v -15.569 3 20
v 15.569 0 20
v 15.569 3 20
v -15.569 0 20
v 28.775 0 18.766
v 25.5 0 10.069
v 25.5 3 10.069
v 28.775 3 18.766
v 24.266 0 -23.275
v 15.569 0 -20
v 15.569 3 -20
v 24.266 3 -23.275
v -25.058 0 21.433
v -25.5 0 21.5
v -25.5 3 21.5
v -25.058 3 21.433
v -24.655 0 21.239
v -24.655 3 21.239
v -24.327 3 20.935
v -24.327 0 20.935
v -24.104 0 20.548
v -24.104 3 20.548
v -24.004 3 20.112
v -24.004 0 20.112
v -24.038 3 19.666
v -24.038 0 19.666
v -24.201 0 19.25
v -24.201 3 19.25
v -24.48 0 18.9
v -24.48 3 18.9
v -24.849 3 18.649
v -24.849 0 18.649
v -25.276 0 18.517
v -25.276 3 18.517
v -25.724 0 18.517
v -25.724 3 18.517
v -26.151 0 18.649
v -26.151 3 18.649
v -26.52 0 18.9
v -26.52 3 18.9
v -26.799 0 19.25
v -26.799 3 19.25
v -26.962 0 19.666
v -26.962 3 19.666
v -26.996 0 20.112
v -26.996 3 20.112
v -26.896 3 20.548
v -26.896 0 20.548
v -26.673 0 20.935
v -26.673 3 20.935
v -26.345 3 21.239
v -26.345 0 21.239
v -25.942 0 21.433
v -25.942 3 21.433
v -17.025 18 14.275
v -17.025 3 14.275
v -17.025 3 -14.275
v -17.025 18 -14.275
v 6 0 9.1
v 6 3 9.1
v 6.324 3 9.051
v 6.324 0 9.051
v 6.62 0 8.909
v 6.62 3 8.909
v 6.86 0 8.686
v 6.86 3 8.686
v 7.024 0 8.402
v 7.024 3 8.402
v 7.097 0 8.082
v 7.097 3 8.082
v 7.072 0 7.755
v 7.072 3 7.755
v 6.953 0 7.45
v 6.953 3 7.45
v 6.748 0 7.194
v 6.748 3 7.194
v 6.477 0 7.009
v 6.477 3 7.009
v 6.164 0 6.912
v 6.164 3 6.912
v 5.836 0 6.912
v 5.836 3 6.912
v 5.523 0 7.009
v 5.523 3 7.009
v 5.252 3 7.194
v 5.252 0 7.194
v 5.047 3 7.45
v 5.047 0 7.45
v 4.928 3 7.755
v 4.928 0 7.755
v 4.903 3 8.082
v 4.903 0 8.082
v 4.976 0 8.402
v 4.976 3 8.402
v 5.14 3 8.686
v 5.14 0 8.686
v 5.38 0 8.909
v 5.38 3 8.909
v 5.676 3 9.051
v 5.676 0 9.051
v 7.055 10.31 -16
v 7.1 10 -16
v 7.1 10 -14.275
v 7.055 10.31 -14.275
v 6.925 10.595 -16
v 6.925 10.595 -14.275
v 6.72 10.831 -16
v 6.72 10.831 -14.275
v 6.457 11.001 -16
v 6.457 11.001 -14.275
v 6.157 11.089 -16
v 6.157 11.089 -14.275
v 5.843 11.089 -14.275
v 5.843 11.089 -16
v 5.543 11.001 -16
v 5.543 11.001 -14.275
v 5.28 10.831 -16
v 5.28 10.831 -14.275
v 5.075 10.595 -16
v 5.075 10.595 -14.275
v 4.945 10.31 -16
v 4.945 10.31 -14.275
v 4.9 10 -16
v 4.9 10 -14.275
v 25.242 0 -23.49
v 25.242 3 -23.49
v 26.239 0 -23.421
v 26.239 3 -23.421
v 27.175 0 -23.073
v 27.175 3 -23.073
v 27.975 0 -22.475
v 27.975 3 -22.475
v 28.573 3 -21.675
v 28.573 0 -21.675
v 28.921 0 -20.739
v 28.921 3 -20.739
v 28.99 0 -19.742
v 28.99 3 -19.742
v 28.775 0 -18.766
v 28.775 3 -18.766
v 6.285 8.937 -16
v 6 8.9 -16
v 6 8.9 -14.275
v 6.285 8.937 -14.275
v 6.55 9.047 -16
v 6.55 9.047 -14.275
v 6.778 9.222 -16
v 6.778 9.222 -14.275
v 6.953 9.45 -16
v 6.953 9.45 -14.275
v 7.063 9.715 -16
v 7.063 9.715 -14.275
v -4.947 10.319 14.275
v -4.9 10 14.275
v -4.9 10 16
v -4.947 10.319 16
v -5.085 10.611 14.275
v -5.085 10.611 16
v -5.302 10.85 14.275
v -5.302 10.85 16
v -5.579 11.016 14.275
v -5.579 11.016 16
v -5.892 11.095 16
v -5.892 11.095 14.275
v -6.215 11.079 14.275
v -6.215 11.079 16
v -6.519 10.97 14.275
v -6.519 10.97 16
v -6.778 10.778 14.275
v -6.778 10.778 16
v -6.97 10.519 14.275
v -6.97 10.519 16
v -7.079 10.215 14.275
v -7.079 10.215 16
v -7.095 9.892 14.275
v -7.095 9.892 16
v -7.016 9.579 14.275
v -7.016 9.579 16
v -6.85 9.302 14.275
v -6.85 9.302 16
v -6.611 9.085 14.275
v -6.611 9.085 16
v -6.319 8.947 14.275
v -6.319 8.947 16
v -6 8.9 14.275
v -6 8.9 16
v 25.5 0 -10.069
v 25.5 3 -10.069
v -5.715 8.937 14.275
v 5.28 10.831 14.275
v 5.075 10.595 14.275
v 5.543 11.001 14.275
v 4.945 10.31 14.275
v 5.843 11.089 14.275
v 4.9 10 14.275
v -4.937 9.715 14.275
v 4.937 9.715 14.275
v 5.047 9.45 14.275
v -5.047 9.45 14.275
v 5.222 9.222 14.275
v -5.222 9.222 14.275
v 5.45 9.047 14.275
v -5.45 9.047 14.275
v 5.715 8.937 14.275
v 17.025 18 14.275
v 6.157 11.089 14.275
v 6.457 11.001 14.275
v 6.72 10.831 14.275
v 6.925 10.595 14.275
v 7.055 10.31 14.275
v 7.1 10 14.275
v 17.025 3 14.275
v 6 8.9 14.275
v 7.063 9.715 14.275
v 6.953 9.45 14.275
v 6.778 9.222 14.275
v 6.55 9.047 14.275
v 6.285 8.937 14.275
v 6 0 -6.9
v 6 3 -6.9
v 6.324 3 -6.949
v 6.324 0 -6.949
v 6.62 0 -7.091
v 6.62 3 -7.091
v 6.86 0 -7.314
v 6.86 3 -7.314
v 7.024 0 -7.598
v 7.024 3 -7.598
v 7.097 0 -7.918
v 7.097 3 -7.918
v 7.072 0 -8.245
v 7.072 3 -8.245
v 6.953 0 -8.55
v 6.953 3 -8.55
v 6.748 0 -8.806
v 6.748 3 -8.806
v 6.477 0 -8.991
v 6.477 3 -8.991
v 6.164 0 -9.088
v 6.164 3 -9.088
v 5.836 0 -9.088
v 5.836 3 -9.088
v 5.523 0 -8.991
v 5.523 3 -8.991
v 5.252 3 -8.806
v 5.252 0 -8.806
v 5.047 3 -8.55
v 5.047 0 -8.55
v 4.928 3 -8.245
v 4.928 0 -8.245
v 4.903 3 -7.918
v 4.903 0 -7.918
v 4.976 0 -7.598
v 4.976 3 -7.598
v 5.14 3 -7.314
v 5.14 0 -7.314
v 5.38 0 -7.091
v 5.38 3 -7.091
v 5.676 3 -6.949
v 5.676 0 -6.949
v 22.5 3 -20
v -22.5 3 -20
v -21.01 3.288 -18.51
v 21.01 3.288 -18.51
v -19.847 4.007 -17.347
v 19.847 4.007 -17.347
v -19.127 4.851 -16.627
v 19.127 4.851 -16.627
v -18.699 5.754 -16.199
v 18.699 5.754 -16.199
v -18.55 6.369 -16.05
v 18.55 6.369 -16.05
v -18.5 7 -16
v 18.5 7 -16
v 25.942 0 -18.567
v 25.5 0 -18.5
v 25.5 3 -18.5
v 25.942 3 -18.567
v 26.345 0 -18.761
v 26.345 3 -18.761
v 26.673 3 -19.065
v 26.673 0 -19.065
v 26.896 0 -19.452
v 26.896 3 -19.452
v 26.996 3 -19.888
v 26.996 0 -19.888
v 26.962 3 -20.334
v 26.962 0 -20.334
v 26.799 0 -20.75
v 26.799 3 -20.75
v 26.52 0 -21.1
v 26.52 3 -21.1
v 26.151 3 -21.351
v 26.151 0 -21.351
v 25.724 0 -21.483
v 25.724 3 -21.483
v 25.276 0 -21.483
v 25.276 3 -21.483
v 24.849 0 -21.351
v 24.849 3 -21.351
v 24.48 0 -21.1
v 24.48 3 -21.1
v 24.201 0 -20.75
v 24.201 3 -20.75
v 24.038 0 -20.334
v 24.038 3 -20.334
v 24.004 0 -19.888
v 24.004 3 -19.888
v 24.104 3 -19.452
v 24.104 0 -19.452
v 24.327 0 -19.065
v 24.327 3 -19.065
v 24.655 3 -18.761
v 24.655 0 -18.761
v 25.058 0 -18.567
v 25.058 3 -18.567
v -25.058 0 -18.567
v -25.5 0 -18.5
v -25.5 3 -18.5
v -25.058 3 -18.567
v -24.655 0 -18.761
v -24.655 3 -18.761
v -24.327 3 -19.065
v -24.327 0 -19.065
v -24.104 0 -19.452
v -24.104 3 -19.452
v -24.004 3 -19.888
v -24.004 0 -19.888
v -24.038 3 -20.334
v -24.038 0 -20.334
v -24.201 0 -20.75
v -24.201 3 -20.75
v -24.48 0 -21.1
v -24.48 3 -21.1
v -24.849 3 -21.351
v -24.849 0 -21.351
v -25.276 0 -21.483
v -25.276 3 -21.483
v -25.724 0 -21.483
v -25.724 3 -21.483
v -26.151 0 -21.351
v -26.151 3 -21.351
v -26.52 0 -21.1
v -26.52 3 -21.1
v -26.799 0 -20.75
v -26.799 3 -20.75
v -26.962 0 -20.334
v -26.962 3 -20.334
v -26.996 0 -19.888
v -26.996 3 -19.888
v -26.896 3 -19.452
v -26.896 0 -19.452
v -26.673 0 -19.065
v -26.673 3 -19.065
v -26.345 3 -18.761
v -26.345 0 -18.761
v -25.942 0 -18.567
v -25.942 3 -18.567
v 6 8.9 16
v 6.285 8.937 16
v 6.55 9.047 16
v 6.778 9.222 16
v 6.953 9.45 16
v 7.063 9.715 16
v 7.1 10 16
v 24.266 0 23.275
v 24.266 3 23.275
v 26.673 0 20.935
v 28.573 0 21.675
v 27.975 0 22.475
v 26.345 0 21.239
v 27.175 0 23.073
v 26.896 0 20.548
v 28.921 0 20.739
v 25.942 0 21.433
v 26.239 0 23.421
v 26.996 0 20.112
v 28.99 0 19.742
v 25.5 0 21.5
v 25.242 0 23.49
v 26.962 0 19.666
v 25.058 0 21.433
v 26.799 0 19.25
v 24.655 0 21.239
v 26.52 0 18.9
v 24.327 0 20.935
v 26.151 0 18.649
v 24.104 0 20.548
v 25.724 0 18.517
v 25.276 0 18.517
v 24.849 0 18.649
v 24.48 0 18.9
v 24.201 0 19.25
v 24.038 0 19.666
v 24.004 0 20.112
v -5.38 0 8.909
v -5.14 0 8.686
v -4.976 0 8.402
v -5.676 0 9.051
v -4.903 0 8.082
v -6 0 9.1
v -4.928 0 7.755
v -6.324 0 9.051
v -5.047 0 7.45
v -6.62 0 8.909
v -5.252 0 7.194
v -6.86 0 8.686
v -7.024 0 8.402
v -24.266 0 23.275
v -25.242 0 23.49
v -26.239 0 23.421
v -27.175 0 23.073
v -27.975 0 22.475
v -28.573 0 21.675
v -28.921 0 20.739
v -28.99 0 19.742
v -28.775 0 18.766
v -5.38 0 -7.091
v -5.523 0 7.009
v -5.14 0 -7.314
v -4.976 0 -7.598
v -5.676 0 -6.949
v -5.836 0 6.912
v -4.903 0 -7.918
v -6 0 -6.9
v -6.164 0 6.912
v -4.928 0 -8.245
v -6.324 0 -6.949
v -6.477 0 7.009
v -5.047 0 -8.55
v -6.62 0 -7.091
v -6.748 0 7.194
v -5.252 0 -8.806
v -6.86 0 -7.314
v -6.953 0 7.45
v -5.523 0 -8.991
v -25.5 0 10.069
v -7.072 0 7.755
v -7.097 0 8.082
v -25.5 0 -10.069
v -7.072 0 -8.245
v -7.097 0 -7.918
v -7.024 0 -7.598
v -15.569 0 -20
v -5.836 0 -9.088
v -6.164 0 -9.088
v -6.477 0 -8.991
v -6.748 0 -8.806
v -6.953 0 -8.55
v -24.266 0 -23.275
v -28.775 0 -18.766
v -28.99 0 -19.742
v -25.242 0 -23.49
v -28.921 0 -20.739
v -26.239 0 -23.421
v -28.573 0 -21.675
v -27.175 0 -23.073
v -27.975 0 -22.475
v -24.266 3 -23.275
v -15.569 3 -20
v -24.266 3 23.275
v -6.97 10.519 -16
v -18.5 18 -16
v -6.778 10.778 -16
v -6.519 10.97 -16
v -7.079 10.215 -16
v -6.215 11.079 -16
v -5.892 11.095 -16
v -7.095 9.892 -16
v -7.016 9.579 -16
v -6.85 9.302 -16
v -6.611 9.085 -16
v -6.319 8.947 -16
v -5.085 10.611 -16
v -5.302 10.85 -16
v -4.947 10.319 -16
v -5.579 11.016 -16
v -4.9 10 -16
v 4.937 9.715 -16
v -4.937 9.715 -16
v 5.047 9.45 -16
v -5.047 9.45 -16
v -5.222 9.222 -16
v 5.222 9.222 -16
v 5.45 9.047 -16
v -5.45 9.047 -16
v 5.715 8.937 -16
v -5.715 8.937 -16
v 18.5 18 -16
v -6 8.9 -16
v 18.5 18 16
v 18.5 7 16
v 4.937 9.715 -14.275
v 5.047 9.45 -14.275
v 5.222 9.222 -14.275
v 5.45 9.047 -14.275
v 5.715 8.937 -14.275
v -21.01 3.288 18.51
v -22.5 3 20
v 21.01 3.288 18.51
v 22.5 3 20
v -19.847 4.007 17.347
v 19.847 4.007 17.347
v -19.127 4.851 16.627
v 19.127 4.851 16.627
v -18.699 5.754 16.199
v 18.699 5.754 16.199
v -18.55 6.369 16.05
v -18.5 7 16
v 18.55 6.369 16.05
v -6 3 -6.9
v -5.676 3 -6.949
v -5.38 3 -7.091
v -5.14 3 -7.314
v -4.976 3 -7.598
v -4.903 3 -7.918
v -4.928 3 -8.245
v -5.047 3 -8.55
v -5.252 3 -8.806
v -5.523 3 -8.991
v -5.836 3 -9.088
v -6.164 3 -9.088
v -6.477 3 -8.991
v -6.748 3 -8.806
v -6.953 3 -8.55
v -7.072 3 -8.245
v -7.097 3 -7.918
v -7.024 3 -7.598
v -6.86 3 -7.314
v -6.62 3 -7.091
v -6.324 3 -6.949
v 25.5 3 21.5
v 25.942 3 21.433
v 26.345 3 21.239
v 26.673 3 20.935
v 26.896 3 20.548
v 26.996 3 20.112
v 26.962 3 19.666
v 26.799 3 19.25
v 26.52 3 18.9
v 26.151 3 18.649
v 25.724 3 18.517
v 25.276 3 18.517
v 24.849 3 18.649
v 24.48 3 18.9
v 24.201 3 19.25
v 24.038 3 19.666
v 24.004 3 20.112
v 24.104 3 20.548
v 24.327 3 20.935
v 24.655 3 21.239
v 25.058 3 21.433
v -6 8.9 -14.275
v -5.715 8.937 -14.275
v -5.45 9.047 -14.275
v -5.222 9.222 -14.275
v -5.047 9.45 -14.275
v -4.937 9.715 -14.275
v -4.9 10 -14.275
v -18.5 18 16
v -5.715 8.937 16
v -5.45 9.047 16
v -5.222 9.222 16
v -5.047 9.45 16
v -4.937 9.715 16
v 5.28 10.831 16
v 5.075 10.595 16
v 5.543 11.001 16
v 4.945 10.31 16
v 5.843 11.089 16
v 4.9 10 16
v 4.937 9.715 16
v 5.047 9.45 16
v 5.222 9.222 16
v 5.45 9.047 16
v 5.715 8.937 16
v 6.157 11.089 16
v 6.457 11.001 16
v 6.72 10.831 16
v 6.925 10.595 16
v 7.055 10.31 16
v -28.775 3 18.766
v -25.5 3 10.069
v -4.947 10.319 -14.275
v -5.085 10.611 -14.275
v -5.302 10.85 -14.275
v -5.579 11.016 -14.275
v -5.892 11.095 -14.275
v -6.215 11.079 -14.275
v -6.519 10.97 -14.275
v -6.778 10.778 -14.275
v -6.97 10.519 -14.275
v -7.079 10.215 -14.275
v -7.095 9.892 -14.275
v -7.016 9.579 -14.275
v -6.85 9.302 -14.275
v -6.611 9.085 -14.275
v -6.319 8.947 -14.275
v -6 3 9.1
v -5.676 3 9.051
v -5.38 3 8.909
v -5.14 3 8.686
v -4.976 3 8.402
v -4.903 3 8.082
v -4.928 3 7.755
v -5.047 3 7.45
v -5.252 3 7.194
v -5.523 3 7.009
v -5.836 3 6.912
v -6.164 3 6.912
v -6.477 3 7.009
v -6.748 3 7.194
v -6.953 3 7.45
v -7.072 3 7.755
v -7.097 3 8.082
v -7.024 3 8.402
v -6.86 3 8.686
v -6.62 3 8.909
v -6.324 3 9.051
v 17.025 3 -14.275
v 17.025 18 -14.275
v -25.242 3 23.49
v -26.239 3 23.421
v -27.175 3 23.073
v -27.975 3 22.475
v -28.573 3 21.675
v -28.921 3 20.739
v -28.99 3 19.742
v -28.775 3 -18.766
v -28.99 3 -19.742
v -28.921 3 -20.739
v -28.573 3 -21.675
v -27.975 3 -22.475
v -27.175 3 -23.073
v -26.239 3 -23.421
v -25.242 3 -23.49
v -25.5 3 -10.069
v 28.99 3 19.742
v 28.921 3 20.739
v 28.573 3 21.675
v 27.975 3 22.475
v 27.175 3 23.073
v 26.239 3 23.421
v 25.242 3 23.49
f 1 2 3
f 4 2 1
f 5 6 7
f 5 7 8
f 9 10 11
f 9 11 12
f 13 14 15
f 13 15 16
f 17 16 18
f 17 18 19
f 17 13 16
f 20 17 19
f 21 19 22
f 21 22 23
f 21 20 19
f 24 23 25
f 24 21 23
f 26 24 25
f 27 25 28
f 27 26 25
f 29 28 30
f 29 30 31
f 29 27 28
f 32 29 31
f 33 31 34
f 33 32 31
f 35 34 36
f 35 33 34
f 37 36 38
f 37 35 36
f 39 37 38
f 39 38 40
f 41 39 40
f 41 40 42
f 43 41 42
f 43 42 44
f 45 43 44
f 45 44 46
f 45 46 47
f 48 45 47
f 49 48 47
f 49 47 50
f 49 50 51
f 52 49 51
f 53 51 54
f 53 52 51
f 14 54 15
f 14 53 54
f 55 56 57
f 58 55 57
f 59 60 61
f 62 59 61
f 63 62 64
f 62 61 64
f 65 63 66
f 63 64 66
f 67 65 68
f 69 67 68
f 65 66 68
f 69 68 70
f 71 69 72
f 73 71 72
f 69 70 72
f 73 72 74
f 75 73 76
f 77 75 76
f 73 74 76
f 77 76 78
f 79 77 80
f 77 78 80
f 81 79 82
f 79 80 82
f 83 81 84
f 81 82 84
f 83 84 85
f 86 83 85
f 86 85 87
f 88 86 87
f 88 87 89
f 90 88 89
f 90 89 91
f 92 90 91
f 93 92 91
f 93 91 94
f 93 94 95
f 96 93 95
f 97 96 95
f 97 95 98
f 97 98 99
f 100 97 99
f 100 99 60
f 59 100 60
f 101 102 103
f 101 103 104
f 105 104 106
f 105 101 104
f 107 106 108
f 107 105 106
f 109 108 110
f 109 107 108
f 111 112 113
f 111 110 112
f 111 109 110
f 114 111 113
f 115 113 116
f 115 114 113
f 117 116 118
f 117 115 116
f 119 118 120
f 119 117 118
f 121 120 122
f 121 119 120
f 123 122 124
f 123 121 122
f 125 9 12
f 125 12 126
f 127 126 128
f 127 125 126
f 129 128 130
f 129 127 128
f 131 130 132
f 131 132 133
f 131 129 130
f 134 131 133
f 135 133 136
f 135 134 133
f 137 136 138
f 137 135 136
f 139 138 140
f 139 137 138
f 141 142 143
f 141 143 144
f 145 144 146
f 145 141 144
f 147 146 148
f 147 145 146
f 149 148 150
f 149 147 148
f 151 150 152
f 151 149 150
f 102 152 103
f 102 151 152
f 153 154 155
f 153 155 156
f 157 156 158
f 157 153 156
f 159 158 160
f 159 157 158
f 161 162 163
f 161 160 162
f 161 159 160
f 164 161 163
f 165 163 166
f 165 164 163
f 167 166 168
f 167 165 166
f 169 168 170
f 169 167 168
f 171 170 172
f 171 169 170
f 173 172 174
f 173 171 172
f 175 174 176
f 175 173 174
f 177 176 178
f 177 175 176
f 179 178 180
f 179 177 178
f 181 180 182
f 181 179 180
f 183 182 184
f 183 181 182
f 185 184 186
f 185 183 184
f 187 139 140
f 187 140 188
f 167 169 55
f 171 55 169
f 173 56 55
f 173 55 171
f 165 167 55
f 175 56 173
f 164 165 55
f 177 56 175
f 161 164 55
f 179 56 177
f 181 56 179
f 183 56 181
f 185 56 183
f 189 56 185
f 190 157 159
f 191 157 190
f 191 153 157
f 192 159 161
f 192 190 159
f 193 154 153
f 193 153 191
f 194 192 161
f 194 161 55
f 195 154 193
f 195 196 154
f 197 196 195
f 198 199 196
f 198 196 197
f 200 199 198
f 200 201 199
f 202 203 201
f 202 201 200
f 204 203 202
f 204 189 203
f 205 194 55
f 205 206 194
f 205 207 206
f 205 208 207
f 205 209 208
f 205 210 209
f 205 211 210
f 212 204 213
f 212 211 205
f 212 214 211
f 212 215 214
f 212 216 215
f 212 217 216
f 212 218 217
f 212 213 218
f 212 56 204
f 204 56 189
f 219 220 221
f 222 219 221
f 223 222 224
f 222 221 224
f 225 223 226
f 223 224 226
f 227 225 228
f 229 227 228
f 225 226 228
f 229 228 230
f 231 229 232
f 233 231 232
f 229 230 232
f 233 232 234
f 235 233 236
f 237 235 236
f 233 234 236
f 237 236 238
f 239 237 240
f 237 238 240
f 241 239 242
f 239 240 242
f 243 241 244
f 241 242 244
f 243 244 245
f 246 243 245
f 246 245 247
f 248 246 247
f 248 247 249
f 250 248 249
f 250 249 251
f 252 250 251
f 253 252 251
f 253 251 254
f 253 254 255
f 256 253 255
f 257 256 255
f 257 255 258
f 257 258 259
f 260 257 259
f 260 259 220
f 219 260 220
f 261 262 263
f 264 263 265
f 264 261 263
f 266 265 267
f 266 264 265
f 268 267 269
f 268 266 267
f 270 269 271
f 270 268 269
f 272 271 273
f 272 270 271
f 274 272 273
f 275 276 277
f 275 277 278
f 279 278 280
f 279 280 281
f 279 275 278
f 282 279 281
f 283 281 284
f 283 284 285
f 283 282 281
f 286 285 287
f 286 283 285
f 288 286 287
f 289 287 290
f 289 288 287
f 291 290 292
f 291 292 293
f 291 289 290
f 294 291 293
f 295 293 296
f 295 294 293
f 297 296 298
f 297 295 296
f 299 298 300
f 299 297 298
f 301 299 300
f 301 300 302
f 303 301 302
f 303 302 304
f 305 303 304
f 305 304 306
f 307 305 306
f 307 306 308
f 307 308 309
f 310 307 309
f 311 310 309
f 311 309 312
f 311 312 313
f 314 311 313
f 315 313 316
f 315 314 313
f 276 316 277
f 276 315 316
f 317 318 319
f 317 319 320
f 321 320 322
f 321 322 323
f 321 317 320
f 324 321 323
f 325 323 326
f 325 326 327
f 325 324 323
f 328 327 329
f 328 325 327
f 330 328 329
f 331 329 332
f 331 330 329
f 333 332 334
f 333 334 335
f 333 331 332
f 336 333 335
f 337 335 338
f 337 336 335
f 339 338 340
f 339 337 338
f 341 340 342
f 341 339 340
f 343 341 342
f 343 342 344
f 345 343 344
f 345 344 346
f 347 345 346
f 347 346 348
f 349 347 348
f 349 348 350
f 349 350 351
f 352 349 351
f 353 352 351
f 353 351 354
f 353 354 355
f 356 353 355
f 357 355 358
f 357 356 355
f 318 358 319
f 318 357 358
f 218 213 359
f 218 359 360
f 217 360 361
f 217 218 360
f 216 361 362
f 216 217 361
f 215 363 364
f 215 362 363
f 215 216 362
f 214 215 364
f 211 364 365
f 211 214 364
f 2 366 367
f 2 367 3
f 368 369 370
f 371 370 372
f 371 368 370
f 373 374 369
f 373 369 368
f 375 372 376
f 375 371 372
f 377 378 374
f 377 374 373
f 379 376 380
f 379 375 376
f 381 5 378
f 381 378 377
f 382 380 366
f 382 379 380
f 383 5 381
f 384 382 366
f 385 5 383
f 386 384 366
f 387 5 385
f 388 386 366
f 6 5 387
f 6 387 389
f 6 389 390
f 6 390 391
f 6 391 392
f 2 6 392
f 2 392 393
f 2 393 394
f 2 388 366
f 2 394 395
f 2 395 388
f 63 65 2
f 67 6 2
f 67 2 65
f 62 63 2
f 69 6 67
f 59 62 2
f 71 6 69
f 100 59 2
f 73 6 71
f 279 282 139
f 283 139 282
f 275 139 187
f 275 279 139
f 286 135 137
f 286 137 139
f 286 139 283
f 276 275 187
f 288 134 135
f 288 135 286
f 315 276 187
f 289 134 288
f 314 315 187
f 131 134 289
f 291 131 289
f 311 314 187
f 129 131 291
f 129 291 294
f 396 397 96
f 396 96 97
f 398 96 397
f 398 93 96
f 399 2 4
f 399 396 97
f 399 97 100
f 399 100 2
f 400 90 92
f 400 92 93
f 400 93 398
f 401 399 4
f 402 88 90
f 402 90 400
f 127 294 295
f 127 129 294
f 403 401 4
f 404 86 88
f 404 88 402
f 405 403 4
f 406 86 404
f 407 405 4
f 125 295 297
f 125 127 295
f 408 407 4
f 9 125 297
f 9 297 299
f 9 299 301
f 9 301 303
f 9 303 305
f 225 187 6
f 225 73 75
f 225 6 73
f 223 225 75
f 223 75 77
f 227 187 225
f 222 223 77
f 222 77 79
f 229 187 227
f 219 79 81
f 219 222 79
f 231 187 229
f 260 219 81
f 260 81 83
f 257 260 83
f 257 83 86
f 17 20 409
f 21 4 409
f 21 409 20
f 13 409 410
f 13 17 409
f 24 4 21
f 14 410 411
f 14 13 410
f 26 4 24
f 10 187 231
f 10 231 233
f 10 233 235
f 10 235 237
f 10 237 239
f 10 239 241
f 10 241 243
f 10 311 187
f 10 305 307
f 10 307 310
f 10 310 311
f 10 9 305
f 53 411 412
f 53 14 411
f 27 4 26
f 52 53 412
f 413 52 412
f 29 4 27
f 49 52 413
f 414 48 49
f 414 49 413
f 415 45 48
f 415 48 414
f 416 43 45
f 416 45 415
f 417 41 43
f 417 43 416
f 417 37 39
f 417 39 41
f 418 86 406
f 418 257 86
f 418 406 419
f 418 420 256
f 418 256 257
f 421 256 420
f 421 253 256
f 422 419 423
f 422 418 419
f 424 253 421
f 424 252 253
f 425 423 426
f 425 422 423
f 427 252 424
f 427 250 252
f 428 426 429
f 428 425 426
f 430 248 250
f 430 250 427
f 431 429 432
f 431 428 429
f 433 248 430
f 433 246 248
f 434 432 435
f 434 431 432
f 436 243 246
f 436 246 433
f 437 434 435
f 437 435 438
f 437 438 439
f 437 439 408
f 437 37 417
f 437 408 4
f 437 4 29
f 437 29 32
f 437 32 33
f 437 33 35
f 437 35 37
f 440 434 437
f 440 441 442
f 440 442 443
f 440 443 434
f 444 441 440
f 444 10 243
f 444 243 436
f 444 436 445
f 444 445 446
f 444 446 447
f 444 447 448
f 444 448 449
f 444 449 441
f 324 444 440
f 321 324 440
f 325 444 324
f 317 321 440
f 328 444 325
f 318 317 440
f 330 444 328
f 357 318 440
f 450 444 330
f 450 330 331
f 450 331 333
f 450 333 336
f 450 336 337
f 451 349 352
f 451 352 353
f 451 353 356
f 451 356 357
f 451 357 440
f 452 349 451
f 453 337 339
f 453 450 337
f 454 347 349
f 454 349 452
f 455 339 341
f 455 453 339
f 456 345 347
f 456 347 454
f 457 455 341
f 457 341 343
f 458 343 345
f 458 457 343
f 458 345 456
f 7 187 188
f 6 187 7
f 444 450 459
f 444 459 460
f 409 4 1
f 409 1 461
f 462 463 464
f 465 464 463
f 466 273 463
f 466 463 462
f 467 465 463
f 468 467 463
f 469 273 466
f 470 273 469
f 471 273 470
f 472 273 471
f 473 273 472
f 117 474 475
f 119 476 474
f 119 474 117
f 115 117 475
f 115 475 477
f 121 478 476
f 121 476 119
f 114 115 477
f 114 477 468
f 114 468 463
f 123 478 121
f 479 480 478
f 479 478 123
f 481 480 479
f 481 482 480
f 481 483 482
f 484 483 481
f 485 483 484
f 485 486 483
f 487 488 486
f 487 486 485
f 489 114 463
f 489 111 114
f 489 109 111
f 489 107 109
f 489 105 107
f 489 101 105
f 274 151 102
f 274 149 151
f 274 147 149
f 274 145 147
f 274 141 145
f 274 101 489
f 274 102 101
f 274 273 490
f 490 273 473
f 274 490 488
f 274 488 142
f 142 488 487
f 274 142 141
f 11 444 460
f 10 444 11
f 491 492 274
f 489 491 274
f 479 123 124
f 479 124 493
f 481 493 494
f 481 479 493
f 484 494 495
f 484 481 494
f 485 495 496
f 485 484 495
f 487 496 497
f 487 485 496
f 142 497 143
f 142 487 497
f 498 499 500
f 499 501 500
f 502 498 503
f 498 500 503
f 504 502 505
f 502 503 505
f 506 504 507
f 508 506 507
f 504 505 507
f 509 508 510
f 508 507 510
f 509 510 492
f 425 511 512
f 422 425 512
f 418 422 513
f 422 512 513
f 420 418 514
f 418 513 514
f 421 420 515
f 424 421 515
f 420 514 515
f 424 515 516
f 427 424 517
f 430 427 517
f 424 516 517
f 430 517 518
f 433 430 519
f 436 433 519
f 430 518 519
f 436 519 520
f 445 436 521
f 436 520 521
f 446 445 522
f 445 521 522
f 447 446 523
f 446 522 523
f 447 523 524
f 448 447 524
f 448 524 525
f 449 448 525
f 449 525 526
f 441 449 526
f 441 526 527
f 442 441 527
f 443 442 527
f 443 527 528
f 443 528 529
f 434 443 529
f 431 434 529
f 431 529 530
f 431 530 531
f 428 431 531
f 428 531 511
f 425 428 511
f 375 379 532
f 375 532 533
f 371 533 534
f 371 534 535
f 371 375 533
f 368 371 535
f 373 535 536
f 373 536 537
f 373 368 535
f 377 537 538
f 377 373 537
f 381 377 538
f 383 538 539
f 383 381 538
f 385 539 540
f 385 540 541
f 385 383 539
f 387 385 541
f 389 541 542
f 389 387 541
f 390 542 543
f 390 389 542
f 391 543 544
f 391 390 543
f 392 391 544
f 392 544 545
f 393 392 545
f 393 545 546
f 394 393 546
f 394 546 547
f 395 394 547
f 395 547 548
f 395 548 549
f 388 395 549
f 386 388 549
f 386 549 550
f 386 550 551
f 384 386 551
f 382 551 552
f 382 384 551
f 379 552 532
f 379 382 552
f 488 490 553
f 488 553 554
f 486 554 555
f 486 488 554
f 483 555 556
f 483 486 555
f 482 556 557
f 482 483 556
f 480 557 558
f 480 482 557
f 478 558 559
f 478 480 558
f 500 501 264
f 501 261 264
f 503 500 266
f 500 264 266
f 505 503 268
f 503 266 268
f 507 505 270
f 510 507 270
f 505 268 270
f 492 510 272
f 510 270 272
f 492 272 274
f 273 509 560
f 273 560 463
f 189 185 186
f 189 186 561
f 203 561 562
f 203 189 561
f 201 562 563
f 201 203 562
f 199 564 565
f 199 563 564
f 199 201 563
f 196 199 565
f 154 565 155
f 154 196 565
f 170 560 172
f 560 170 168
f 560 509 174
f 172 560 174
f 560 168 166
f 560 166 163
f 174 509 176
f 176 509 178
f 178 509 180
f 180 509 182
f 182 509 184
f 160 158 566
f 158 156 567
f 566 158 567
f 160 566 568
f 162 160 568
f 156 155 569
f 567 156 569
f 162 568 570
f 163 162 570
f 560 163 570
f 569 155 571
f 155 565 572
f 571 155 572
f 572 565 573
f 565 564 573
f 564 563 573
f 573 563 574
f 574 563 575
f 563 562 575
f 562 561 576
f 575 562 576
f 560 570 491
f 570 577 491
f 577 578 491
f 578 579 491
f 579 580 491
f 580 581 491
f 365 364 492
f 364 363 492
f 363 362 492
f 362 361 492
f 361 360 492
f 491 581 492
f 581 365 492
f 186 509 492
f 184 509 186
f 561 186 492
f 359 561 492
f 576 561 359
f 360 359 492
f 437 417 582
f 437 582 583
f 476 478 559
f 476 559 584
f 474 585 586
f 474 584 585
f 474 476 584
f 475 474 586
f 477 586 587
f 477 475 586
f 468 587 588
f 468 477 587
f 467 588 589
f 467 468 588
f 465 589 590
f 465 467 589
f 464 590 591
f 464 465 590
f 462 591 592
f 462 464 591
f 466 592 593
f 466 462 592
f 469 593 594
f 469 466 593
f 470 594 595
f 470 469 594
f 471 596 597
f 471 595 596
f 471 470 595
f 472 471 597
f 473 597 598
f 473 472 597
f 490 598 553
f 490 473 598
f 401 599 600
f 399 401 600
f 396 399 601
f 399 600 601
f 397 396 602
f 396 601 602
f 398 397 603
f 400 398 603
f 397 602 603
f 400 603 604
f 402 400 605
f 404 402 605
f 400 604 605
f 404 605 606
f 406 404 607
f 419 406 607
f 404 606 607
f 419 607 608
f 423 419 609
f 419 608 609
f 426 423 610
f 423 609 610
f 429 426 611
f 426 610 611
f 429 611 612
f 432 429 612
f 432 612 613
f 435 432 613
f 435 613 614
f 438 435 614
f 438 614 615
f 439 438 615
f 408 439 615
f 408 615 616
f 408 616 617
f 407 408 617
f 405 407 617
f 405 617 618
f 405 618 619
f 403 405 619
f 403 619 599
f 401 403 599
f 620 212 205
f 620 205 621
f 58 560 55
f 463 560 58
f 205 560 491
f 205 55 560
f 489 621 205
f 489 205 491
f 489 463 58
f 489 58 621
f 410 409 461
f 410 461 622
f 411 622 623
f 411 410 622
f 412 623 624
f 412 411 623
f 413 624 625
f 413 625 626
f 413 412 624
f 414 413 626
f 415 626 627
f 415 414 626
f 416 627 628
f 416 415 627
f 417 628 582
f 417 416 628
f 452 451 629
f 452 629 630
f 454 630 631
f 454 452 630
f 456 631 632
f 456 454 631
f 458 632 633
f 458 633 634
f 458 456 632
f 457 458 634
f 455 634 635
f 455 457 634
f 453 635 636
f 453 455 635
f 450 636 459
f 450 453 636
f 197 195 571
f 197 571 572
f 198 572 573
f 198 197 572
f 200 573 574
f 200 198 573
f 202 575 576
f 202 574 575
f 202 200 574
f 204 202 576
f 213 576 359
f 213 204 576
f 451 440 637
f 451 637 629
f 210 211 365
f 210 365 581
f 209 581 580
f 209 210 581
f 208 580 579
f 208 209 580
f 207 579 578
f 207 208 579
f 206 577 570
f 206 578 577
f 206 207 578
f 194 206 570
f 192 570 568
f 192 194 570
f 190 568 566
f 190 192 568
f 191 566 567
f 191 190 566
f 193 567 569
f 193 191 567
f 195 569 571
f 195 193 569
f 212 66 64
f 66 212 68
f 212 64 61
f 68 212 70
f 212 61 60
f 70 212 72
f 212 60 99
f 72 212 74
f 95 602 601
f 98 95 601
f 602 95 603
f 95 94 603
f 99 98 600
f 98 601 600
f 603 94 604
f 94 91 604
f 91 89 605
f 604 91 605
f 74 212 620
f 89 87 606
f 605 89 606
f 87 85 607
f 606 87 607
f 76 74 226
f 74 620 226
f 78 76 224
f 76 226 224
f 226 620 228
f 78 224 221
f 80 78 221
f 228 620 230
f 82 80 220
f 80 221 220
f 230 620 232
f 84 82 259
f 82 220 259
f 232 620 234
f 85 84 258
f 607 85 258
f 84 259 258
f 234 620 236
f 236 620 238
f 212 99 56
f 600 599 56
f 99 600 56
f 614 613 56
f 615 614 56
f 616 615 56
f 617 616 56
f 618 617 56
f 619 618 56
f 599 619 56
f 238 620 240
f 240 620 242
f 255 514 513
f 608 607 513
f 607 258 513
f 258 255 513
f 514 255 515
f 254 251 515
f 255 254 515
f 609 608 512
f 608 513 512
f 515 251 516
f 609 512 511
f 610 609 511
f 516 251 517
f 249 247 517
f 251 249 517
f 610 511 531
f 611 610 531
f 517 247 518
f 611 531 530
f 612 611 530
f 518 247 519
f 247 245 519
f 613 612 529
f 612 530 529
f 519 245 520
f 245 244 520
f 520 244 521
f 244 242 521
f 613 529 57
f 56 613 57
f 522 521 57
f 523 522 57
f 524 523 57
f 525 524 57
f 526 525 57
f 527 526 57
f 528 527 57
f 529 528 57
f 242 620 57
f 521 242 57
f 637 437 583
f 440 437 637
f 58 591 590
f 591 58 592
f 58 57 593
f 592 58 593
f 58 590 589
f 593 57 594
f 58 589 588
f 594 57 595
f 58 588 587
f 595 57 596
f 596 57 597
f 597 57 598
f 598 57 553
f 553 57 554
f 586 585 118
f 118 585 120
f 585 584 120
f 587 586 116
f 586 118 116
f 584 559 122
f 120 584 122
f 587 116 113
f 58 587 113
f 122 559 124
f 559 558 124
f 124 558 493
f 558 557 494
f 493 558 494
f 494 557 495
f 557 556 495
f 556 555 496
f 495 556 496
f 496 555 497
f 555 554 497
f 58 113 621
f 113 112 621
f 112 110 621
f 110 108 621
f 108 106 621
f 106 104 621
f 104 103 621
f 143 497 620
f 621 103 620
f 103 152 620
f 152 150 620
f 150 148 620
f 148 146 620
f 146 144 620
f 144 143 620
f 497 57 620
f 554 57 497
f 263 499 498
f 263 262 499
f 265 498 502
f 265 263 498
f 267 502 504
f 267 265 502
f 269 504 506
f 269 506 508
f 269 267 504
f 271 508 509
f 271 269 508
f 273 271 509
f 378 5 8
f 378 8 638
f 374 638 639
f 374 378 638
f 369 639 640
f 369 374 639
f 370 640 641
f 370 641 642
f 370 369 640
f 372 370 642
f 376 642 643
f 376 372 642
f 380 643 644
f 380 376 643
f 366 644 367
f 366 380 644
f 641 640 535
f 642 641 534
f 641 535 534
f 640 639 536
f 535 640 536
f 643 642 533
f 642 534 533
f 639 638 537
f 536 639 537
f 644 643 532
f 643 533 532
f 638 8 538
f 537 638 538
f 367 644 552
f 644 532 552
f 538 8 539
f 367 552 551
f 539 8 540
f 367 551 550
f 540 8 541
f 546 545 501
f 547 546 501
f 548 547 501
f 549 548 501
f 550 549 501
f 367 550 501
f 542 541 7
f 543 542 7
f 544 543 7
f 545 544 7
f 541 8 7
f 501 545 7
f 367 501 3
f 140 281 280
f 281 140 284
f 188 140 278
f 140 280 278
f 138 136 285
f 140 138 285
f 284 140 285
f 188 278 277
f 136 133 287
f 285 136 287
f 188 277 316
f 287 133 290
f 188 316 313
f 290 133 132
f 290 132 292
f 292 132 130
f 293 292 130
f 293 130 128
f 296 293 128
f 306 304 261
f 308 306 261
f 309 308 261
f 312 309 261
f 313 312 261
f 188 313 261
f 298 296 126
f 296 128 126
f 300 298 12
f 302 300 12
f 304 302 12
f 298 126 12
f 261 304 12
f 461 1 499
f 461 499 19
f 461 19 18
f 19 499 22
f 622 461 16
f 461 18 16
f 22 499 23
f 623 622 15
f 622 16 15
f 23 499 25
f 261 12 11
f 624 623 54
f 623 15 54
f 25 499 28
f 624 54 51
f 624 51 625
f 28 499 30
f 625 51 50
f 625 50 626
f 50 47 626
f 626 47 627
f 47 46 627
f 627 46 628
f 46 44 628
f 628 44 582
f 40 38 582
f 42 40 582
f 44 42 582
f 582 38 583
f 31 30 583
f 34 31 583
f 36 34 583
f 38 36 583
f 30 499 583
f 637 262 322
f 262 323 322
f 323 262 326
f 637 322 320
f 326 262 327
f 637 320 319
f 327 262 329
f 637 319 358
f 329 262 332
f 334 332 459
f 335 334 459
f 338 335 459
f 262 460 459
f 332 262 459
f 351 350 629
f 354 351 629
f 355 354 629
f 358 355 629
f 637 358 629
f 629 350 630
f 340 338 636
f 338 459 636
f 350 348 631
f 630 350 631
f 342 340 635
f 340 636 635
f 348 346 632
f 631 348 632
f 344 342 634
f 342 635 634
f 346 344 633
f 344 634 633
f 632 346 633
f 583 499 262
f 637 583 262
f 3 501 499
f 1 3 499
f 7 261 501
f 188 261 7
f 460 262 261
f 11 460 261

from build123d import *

# Parameters (mm, degrees)
SKETCH1_R               = 1.5
BOSS_EXTRUDE2_DEPTH     = 3
SKETCH2_W               = 37
SKETCH2_H               = 32
SKETCH2_W_2             = 34.05
SKETCH2_H_2             = 28.55
BOSS_EXTRUDE3_DEPTH     = 15
CUT_EXTRUDE1_DEPTH      = 40
CUT_EXTRUDE1_DEPTH_BACK = 11
SKETCH2_4_R             = 1.1
CUT_EXTRUDE2_DEPTH      = 11
FILLET1_R               = 4


with BuildPart() as part:
    # Sketch1 → Boss-Extrude2 (new body)
    with BuildSketch(Plane(origin=(0, 0, 0), x_dir=(1, 0, 0), z_dir=(0, 1, 0))):
        with BuildLine():
            Line((-24.266499455, 23.2754353), (-15.568913997, 20))
            Line((-15.568913997, 20), (15.568913997, 20))
            Line((15.568913997, 20), (24.266499455, 23.2754353))
            ThreePointArc((24.266499455, 23.2754353), (27.974873734, 22.474873734), (28.7754353, 18.766499455))
            Line((28.7754353, 18.766499455), (25.5, 10.068913997))
            Line((25.5, 10.068913997), (25.5, -10.068913997))
            Line((25.5, -10.068913997), (28.7754353, -18.766499455))
            ThreePointArc((28.7754353, -18.766499455), (27.974873734, -22.474873734), (24.266499455, -23.2754353))
            Line((24.266499455, -23.2754353), (15.568913997, -20))
            Line((15.568913997, -20), (-15.568913997, -20))
            Line((-15.568913997, -20), (-24.266499455, -23.2754353))
            ThreePointArc((-24.266499455, -23.2754353), (-27.974873734, -22.474873734), (-28.7754353, -18.766499455))
            Line((-28.7754353, -18.766499455), (-25.5, -10.068913997))
            Line((-25.5, -10.068913997), (-25.5, 10.068913997))
            Line((-25.5, 10.068913997), (-28.7754353, 18.766499455))
            ThreePointArc((-28.7754353, 18.766499455), (-27.974873734, 22.474873734), (-24.266499455, 23.2754353))
        make_face()
        with Locations(Location((-25.5, 20, 0), (0, 0, 270))):
            Circle(SKETCH1_R, mode=Mode.SUBTRACT)
        with Locations(Location((25.5, 20, 0), (0, 0, 270))):
            Circle(SKETCH1_R, mode=Mode.SUBTRACT)
        with Locations(Location((25.5, -20, 0), (0, 0, 270))):
            Circle(SKETCH1_R, mode=Mode.SUBTRACT)
        with Locations(Location((-25.5, -20, 0), (0, 0, 270))):
            Circle(SKETCH1_R, mode=Mode.SUBTRACT)
    extrude(amount=BOSS_EXTRUDE2_DEPTH)

    # Sketch2 → Boss-Extrude3 (add)
    with BuildSketch(Plane(origin=(0, 3, 0), x_dir=(1, 0, 0), z_dir=(0, 1, 0))):
        Rectangle(SKETCH2_W, SKETCH2_H)
        Rectangle(SKETCH2_W_2, SKETCH2_H_2, mode=Mode.SUBTRACT)
    extrude(amount=BOSS_EXTRUDE3_DEPTH)

    # Sketch3 → Cut-Extrude1 (cut, two sides: drawn at the far end of the back side and taken through both)
    with BuildSketch(Plane.XY.offset(-14.275).offset(-CUT_EXTRUDE1_DEPTH_BACK)):
        with BuildLine():
            ThreePointArc((-4.9, 10), (-6.777817459, 10.777817459), (-6, 8.9))
            Line((-6, 8.9), (-6, 10))
            Line((-6, 10), (-4.9, 10))
        make_face()
        with BuildLine():
            Line((-6, 10), (-6, 8.9))
            ThreePointArc((-6, 8.9), (-5.222182541, 9.222182541), (-4.9, 10))
            Line((-4.9, 10), (-6, 10))
        make_face()
        with BuildLine():
            ThreePointArc((4.9, 10), (5.222182541, 9.222182541), (6, 8.9))
            Line((6, 8.9), (6, 10))
            Line((6, 10), (4.9, 10))
        make_face()
        with BuildLine():
            Line((6, 10), (6, 8.9))
            ThreePointArc((6, 8.9), (6.777817459, 9.222182541), (7.1, 10))
            ThreePointArc((7.1, 10), (6, 11.1), (4.9, 10))
            Line((4.9, 10), (6, 10))
        make_face()
    extrude(amount=CUT_EXTRUDE1_DEPTH + CUT_EXTRUDE1_DEPTH_BACK, mode=Mode.SUBTRACT)

    # Sketch2<4> → Cut-Extrude2 (cut)
    with BuildSketch(Plane(origin=(0, 3, 0), x_dir=(1, 0, 0), z_dir=(0, 1, 0))):
        with Locations(Location((-6, 8, 0), (0, 0, 270))):
            Circle(SKETCH2_4_R)
        with Locations(Location((6, 8, 0), (0, 0, 270))):
            Circle(SKETCH2_4_R)
        with Locations(Location((6, -8, 0), (0, 0, 270))):
            Circle(SKETCH2_4_R)
        with Locations(Location((-6, -8, 0), (0, 0, 270))):
            Circle(SKETCH2_4_R)
    extrude(amount=-CUT_EXTRUDE2_DEPTH, mode=Mode.SUBTRACT)

    # Fillet1
    fillet1_edges = [part.edges().sort_by_distance(p)[0] for p in [
        (-18.5, 3, 0),
        (0, 3, 16),
        (18.5, 3, 0),
        (0, 3, -16),
    ]]
    fillet(fillet1_edges, radius=FILLET1_R - 0.0001)  # a hair under: the kernel refuses the full size


solid = part.part
